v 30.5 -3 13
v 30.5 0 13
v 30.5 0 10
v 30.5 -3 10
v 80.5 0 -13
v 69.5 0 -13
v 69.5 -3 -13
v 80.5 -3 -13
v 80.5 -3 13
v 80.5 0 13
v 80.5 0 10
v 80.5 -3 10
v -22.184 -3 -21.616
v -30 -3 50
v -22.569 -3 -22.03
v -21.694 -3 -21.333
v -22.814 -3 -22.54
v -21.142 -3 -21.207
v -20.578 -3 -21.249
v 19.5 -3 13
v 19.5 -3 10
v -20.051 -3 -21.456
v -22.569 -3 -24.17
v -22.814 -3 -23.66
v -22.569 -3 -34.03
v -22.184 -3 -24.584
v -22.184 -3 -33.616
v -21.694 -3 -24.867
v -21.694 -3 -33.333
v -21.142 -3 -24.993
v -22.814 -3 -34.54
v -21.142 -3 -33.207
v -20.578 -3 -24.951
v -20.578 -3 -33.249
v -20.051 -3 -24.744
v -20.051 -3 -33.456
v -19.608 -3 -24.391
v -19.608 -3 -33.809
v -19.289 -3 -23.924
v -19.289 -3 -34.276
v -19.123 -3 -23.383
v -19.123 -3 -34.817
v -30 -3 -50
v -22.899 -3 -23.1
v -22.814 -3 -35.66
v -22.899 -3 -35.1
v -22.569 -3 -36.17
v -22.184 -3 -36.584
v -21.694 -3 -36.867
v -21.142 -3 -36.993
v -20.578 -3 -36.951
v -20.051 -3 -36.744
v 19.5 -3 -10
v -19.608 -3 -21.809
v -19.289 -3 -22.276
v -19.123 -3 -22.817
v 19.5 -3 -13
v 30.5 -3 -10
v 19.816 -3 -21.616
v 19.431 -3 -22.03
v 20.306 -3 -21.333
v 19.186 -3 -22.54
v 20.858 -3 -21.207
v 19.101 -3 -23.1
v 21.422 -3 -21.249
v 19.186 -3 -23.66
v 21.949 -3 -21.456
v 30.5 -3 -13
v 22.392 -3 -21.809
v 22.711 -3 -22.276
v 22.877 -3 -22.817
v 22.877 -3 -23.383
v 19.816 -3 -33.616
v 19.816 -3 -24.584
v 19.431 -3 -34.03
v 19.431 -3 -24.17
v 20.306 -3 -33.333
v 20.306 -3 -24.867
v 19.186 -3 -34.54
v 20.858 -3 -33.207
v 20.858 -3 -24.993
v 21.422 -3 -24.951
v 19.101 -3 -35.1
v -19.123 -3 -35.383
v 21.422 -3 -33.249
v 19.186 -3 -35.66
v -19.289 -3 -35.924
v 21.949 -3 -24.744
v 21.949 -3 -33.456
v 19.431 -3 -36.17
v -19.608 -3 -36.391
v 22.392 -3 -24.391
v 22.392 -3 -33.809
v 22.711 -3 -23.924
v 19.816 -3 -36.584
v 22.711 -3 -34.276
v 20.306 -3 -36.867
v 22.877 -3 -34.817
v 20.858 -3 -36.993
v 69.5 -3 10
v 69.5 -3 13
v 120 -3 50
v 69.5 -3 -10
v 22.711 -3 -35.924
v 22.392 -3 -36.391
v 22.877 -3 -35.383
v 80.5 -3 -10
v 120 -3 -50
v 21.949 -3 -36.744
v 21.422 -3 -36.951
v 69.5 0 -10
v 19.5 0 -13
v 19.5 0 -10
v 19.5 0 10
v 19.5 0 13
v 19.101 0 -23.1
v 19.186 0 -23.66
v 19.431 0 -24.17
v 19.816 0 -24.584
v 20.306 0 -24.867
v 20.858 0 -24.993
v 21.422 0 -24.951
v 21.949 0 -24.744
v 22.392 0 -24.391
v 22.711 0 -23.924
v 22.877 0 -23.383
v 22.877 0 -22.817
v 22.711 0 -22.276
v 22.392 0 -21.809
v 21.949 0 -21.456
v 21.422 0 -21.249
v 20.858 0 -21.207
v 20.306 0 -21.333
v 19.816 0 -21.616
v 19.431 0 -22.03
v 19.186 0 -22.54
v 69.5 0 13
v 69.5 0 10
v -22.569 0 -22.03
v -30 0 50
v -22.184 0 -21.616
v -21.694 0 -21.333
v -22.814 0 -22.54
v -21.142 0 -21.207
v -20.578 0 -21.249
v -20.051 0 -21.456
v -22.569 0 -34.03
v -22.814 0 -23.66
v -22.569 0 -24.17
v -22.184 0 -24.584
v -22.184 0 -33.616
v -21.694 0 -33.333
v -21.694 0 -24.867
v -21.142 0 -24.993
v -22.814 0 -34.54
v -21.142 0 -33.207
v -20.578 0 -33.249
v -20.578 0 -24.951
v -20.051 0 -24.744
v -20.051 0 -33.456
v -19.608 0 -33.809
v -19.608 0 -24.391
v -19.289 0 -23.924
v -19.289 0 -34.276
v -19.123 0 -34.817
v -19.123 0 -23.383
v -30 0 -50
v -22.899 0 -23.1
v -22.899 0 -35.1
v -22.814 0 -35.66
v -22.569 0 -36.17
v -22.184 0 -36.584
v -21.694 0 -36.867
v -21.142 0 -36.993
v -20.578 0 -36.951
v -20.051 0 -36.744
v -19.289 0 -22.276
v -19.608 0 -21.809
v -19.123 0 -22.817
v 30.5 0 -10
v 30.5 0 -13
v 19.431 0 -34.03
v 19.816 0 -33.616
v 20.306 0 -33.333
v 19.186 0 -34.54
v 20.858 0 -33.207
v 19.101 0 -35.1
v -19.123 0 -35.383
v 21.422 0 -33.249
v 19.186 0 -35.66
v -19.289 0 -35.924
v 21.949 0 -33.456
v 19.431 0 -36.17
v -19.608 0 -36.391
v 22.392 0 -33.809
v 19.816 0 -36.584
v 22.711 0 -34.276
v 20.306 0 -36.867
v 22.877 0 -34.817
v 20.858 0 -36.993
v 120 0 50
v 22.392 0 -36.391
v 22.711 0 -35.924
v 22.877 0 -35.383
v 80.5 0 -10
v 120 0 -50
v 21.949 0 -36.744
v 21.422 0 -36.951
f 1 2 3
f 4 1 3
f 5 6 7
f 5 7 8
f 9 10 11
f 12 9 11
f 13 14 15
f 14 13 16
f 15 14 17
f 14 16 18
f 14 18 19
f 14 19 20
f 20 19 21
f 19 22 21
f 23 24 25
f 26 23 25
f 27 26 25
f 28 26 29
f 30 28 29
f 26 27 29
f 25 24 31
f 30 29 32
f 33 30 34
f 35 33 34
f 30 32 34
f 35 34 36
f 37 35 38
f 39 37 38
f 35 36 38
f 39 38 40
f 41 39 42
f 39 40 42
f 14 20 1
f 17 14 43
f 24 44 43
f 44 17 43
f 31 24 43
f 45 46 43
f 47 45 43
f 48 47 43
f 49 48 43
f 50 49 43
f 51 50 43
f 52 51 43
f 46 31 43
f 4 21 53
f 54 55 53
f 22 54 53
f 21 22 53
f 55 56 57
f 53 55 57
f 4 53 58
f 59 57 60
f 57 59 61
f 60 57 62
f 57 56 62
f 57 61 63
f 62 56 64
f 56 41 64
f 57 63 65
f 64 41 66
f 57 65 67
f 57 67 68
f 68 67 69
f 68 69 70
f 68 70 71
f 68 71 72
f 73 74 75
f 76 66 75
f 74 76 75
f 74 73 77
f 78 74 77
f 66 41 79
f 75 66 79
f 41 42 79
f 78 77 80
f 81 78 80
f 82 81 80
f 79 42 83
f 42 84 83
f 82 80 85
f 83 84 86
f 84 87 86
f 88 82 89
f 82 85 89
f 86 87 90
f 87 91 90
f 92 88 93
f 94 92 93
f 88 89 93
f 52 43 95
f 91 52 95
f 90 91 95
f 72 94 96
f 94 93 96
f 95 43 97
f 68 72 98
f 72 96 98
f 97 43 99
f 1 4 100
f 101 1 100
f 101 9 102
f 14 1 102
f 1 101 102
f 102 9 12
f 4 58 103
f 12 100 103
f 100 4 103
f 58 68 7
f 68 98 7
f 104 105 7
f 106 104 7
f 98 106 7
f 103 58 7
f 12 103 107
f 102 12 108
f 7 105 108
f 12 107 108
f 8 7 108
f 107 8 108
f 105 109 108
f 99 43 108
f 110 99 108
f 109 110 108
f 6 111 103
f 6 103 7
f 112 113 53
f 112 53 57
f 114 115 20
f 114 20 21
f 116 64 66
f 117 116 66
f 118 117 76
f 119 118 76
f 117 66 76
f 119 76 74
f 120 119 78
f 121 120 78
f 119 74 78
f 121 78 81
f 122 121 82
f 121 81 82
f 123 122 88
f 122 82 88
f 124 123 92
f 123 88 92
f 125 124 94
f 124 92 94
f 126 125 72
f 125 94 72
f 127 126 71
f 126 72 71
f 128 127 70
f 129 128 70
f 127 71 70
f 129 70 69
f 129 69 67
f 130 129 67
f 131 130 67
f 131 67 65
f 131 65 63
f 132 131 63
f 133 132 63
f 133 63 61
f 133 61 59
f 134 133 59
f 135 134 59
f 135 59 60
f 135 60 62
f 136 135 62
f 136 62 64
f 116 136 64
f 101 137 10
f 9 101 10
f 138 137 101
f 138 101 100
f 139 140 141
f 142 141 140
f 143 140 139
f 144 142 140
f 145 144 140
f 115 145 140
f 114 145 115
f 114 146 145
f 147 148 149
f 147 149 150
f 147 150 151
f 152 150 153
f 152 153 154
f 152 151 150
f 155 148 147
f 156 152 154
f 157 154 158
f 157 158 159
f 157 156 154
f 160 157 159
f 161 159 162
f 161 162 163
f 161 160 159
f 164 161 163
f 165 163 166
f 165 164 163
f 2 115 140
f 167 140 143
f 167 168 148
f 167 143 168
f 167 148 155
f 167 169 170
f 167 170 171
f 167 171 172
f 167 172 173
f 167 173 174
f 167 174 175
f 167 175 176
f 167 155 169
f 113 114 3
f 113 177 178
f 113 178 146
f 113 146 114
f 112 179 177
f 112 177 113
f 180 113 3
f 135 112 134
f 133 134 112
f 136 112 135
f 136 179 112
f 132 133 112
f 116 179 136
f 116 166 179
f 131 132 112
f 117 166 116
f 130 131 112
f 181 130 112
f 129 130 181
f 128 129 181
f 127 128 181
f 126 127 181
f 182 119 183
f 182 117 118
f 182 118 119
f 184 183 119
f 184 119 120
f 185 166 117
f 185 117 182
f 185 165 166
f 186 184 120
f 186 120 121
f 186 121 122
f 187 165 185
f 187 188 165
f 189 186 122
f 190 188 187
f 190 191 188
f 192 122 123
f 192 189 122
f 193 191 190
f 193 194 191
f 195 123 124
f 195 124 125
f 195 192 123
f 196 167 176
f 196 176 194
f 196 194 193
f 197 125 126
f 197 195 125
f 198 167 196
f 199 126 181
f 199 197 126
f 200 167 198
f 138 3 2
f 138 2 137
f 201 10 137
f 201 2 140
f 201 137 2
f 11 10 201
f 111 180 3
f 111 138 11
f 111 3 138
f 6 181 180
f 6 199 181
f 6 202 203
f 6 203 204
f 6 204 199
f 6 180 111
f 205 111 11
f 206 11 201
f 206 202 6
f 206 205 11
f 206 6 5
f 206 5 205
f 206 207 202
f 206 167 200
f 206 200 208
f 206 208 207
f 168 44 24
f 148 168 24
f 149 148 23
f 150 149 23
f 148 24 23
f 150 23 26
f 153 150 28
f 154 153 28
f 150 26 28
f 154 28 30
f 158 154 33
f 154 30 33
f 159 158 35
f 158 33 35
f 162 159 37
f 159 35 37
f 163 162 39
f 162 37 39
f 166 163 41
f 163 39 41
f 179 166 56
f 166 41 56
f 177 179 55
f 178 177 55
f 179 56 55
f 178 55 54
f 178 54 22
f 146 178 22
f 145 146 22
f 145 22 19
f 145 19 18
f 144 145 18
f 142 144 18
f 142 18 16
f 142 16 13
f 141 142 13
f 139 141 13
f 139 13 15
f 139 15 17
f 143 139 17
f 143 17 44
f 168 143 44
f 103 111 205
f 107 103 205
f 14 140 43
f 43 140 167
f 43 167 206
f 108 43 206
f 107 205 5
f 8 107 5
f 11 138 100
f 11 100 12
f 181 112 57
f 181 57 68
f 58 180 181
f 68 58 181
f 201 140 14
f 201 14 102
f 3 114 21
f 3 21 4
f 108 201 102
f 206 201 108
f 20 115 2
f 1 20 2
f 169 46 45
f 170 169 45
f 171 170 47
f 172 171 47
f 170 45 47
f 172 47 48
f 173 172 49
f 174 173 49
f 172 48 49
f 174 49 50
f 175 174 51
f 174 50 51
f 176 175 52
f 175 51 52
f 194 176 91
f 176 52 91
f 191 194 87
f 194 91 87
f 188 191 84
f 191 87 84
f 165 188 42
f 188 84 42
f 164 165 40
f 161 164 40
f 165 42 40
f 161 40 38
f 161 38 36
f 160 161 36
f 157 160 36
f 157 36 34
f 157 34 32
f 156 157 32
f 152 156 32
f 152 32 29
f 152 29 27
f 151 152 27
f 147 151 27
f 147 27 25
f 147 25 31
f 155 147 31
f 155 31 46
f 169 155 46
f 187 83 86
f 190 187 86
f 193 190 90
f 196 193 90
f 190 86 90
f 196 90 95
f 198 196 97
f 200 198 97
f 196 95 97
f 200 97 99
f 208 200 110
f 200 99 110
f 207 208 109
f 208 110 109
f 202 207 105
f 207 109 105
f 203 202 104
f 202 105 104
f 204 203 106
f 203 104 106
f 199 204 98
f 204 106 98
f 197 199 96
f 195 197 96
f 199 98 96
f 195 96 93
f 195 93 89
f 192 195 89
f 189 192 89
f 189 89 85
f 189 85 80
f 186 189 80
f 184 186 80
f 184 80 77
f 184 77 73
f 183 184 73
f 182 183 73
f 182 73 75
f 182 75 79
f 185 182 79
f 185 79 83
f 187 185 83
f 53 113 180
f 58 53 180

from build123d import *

# Parameters (mm, degrees)
SKETCH1_W                     = 150
SKETCH1_H                     = 100
BASEPLATE_DEPTH               = 3
F_6_CLEARANCE_HOLE1_D         = 3.7973
SKETCH4_W                     = 11
SKETCH4_H                     = 3
BASETABHOLE_DEPTH             = 131.034610777
BASETABHOLEPATTERN_COUNT      = 2
BASETABHOLEPATTERN_PITCH      = 50
BASETABHOLEPATTERN_COUNT_DIR2 = 2
BASETABHOLEPATTERN_PITCH_DIR2 = 23


with BuildPart() as part:
    # Sketch1 → BasePlate (new body)
    with BuildSketch(Plane(origin=(0, 0, 0), x_dir=(1, 0, 0), z_dir=(0, 1, 0))):
        with Locations((45, 0)):
            Rectangle(SKETCH1_W, SKETCH1_H)
    extrude(amount=-BASEPLATE_DEPTH)

    # #6 Clearance Hole1 (through all)
    with Locations(Plane(origin=(0, 0, 0), x_dir=(1, 0, 0), z_dir=(0, 1, 0))):
        with Locations((-21, 23.1), (21, 23.1), (21, 35.1), (-21, 35.1)):
            Hole(F_6_CLEARANCE_HOLE1_D / 2)

    # Sketch4 → BaseTabHole (cut, through all)
    with BuildSketch(Plane(origin=(0, 0, 0), x_dir=(1, 0, 0), z_dir=(0, 1, 0))):
        with Locations((25, 11.5)):
            Rectangle(SKETCH4_W, SKETCH4_H)
    basetabhole = extrude(amount=-BASETABHOLE_DEPTH, mode=Mode.SUBTRACT)

    # BaseTabHolePattern: BaseTabHole 2 × 2
    with Locations(*[(i * BASETABHOLEPATTERN_PITCH, 0, j * BASETABHOLEPATTERN_PITCH_DIR2) for i in range(BASETABHOLEPATTERN_COUNT) for j in range(BASETABHOLEPATTERN_COUNT_DIR2) if (i, j) != (0, 0)]):
        add(basetabhole, mode=Mode.SUBTRACT)


solid = part.part
